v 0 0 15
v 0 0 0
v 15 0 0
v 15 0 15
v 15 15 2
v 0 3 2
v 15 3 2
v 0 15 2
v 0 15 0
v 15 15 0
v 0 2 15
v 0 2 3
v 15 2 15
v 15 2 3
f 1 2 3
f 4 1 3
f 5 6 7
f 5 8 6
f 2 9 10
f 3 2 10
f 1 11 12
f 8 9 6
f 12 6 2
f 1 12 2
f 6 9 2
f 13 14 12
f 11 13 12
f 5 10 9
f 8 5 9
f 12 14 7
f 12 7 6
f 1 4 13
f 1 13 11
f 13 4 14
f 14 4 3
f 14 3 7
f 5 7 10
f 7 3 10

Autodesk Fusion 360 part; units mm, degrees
sketch "Sketch1" plane through (0, 0, 0) normal (0, 0, 1) x (1, 0, 0)
  line L0 (0, 0) -> (15, 0)
  line L1 (15, 0) -> (15, 15)
  line L2 (15, 15) -> (0, 15)
  line L3 (0, 15) -> (0, 0)
  dimension "d1" = 15
  dimension "d2" = 15
extrude "Extrude1" add sketch "Sketch1" along normal blind 2
sketch "Sketch2" plane through (0, 0, 2) normal (0, 0, 1) x (-1, 0, 0)
  line L0 (0, -15) -> (0, 0)
  line L1 (0, 0) -> (-15, 0)
  line L2 (-15, 0) -> (-15, -15)
  line L3 (-15, -15) -> (0, -15)
  line L4 (0, 0) -> (-15, 0)
  line L5 (-15, 0) -> (-15, -2)
  line L6 (-15, -2) -> (0, -2)
  line L7 (0, -2) -> (0, 0)
  dimension "d5" = 2
extrude "Extrude2" add sketch "Sketch2" along normal blind 13 contours L0 L1 L2 L4 L5 L6 L7
chamfer "Chamfer1" distance 1 angle 45 1 edges at (7.5, 2, 2)
